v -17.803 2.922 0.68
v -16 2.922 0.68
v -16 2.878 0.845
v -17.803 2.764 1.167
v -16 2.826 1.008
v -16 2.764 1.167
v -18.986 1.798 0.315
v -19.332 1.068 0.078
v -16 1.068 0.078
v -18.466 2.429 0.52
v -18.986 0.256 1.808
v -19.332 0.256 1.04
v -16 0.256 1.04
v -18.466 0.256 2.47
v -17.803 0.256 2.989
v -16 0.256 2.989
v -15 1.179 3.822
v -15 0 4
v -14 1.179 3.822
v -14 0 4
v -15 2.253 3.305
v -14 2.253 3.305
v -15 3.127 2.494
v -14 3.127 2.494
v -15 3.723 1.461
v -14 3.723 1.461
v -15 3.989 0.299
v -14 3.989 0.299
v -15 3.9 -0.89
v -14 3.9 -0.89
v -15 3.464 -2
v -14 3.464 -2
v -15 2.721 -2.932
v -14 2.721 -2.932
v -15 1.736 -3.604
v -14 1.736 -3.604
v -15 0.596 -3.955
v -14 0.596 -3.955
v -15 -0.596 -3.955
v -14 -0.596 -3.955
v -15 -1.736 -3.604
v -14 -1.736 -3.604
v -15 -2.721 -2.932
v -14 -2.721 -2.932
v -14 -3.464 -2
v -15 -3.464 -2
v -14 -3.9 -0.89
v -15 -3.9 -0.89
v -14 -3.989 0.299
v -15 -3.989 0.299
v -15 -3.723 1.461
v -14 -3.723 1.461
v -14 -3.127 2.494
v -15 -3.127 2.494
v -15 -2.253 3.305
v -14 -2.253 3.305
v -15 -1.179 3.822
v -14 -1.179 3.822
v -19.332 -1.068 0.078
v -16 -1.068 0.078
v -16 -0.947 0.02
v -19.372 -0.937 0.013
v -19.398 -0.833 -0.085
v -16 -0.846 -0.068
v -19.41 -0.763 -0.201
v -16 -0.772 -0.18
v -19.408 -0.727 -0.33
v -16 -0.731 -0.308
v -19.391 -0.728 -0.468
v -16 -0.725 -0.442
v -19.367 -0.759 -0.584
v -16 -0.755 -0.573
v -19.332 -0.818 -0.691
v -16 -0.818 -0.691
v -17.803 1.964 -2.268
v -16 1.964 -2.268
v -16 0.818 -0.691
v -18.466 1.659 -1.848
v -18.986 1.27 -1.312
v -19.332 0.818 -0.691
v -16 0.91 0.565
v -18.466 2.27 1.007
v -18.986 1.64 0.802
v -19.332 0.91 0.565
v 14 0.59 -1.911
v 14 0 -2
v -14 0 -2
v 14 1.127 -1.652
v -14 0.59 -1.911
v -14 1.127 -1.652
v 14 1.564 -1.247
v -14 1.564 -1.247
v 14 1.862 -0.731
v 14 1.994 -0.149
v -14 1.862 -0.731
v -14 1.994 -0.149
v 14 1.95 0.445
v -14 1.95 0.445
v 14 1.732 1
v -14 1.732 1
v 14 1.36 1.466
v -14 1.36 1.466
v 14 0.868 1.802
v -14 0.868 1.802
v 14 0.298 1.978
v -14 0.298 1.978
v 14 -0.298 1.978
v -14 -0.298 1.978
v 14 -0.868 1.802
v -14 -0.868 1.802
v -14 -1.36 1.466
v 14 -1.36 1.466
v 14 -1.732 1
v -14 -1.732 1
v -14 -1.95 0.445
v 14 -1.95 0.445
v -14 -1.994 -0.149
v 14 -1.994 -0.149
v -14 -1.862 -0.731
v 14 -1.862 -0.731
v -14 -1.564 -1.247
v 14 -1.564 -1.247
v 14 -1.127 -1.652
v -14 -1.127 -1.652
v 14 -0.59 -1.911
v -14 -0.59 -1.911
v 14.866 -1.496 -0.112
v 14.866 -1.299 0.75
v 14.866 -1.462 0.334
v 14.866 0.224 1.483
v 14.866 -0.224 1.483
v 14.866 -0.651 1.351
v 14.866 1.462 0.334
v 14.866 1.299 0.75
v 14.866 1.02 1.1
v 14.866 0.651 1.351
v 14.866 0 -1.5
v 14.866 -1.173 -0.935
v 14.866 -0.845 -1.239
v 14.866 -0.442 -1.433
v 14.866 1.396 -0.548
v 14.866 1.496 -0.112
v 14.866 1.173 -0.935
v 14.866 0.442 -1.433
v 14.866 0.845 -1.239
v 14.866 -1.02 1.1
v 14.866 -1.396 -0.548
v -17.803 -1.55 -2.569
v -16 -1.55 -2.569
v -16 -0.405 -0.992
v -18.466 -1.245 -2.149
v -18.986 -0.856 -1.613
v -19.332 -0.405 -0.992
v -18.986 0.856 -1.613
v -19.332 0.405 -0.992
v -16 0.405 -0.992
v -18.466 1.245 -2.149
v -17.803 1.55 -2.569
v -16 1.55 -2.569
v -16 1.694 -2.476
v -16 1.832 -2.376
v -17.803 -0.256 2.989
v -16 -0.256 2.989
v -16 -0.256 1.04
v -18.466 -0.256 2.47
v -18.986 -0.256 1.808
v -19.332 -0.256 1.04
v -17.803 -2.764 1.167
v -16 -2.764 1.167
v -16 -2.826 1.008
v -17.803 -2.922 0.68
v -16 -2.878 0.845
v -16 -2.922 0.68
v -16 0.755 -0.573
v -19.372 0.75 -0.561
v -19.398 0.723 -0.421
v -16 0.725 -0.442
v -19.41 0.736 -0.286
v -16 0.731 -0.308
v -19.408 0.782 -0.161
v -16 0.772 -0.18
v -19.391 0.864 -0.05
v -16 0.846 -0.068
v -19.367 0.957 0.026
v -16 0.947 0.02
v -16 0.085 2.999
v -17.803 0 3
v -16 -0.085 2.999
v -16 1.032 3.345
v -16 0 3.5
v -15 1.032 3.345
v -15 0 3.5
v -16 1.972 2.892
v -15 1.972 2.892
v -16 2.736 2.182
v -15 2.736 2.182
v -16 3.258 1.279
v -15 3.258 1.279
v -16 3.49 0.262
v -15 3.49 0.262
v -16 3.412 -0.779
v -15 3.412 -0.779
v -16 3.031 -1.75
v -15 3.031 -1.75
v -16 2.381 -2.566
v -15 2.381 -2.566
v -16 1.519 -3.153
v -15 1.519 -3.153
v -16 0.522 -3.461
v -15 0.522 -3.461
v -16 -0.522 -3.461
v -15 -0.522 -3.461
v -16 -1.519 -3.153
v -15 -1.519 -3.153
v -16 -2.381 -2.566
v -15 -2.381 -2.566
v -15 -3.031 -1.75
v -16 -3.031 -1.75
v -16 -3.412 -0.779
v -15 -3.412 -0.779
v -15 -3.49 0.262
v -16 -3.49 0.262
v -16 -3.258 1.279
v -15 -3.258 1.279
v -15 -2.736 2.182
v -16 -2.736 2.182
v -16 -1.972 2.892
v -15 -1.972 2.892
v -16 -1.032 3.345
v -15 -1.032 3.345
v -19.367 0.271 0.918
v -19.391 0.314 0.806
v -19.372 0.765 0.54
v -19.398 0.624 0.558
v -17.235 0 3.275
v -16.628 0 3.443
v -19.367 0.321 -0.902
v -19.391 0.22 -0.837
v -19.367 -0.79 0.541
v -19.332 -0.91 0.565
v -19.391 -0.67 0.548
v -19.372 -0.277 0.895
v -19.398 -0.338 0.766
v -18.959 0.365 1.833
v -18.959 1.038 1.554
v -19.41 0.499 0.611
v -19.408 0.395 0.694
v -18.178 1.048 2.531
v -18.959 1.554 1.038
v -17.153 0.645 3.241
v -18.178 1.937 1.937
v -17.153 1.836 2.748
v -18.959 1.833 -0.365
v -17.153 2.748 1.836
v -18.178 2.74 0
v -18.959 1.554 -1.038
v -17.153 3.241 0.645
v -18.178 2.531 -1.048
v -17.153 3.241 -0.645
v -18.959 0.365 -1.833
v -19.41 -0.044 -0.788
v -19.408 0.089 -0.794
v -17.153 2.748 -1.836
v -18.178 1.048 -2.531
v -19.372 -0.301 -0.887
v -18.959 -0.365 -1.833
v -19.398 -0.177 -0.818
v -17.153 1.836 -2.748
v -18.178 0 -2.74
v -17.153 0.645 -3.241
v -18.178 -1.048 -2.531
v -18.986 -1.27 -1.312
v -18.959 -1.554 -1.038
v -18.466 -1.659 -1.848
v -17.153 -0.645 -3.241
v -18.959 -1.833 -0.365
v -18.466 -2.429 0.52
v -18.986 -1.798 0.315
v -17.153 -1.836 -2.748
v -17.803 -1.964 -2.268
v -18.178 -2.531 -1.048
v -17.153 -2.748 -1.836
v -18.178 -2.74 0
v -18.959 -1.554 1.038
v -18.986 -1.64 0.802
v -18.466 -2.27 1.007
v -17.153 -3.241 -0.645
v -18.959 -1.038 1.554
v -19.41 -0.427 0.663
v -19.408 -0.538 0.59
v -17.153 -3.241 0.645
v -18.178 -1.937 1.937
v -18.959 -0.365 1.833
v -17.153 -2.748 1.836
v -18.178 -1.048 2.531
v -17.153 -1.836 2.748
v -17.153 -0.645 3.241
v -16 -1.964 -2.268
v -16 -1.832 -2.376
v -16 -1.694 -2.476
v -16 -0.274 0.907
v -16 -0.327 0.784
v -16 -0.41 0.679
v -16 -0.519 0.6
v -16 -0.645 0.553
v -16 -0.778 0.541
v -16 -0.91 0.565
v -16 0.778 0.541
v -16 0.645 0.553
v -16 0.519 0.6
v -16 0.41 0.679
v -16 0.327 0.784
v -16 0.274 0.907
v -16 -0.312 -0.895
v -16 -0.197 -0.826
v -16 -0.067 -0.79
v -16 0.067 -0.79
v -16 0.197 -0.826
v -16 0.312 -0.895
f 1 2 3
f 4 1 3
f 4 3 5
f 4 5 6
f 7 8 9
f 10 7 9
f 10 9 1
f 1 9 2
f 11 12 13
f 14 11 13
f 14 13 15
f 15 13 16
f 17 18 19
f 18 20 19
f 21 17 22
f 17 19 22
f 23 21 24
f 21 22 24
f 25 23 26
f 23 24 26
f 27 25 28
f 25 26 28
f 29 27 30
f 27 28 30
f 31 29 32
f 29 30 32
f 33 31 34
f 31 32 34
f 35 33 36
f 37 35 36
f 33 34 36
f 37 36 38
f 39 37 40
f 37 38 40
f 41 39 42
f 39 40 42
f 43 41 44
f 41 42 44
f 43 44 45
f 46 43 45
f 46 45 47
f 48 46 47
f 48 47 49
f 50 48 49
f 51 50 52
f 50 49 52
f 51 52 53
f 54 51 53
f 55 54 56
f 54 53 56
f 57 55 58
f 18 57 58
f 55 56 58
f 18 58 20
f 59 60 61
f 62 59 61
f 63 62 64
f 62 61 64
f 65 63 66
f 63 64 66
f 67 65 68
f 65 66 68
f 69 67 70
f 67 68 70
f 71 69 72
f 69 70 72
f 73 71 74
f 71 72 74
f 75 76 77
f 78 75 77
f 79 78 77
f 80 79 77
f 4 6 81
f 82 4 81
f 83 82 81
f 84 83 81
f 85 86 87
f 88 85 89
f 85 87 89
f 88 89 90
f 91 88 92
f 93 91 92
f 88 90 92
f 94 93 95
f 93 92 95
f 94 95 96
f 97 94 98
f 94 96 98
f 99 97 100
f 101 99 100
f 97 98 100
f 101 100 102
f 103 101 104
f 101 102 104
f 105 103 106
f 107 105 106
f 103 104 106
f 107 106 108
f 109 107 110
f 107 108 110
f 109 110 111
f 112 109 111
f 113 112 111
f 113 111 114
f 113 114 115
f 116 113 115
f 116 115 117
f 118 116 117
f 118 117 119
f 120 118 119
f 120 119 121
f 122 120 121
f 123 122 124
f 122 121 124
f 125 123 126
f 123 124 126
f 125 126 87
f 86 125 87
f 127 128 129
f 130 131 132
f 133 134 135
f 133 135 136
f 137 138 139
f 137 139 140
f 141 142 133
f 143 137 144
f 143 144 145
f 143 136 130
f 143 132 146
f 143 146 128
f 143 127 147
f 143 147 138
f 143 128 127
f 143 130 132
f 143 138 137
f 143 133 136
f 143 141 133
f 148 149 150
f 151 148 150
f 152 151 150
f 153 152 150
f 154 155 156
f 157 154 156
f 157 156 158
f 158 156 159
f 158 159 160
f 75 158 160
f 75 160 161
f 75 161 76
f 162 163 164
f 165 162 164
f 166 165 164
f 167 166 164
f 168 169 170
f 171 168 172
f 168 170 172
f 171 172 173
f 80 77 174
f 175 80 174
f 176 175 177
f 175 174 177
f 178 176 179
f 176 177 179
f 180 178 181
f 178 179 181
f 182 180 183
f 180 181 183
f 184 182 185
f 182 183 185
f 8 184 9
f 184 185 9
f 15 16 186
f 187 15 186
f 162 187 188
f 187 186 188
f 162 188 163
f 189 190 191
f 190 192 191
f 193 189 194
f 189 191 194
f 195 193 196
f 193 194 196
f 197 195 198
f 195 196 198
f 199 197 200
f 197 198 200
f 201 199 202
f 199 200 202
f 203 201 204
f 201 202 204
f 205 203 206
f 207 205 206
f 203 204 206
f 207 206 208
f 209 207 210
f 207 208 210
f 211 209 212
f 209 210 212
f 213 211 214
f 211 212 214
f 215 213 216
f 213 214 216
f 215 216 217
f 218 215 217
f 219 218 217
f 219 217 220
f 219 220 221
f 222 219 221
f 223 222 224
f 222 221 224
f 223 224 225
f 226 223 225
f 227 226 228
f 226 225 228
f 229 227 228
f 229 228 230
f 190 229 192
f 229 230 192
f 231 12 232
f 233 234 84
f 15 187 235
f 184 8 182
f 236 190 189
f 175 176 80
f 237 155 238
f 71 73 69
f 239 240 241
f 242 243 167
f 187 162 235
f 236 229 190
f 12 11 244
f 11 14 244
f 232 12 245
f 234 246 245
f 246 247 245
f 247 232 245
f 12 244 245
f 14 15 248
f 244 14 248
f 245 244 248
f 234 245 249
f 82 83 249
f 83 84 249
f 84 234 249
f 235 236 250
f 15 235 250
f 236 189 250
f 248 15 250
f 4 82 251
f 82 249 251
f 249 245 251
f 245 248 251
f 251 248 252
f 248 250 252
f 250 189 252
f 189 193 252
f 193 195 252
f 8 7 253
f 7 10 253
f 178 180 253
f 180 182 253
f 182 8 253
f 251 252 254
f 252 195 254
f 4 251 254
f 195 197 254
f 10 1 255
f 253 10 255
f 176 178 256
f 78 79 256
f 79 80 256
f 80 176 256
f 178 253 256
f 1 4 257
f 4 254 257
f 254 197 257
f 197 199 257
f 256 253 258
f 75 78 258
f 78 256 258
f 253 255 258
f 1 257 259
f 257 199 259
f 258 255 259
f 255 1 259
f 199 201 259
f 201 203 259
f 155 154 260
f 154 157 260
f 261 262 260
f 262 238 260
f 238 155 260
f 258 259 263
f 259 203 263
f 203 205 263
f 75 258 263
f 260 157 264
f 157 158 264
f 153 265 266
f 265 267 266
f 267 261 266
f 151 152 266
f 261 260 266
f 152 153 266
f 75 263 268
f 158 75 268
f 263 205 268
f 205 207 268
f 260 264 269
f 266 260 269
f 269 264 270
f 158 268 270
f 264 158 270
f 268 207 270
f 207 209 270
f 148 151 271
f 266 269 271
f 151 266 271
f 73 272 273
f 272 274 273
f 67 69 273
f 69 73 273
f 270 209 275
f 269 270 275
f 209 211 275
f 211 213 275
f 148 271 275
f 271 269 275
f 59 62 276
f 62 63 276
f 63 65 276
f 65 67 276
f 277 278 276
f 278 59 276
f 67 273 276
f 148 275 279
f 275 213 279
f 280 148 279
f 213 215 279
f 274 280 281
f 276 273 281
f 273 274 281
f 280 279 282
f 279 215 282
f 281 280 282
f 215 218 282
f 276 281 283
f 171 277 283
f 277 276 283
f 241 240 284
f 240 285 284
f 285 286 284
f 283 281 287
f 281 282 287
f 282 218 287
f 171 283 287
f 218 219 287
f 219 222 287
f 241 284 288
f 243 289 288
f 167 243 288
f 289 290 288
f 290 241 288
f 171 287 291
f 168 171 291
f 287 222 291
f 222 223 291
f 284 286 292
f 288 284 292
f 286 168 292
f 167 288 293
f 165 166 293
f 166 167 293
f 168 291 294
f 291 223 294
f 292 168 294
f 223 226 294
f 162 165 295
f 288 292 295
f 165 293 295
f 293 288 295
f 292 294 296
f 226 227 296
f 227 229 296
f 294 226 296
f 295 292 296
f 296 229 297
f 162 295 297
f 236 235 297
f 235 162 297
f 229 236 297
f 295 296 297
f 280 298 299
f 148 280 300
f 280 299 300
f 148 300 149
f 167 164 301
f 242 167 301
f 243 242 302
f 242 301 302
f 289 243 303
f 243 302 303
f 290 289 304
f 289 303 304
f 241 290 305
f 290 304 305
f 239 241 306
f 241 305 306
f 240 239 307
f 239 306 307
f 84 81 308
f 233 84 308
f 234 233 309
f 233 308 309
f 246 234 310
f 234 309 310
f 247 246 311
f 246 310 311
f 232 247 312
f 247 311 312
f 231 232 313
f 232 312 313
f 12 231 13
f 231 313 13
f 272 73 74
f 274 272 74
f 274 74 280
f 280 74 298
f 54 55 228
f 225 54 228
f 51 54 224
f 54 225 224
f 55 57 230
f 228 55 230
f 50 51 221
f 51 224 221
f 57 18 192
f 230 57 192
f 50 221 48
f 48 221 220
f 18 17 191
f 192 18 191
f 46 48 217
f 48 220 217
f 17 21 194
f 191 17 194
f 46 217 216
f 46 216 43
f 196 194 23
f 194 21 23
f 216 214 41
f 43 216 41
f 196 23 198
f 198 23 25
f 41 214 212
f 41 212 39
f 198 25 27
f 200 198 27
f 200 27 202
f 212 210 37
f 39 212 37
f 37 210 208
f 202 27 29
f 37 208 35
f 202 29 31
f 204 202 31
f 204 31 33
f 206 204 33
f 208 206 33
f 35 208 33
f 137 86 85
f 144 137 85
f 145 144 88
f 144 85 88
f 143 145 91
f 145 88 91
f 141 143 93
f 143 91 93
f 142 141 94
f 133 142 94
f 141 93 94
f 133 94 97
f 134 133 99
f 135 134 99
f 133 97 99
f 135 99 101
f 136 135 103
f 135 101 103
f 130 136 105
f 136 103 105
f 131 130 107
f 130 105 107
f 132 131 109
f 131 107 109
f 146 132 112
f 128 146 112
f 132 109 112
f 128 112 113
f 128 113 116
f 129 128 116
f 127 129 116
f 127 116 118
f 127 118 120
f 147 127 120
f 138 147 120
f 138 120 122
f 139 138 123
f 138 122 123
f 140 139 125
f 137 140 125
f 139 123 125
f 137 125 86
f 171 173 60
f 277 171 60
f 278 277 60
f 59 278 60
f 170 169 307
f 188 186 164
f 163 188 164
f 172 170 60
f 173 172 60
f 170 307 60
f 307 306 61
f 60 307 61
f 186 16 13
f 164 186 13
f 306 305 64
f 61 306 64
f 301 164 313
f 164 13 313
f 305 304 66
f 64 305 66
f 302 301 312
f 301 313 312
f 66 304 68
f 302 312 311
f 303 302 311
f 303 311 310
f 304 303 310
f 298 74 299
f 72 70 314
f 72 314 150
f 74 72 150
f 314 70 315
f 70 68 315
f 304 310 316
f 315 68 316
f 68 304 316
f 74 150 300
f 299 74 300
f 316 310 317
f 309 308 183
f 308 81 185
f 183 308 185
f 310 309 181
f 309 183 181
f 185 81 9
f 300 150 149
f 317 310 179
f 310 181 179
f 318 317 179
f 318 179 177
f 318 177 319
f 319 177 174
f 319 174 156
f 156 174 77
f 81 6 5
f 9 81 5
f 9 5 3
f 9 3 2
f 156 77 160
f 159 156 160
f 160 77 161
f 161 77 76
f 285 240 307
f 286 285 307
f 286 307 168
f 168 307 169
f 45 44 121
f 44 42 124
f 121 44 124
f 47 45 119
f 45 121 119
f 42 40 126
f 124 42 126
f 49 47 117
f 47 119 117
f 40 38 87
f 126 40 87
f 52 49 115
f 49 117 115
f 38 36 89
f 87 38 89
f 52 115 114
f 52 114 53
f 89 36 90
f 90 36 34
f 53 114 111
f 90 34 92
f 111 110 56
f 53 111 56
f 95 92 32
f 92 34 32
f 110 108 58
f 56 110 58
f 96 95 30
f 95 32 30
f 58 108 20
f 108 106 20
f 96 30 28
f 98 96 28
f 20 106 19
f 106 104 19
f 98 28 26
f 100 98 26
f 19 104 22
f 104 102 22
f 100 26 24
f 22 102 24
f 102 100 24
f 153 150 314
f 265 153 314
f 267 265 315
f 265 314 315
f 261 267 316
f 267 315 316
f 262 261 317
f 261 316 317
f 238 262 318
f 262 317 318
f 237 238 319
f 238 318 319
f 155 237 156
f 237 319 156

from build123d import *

# Parameters (mm, degrees)
SKETCH2_R               = 2
BOSS_EXTRUDE1_DEPTH     = 28.866025404
CUT_EXTRUDE1_REACH      = 33.38
CUT_EXTRUDE1_END_RADIUS = 3.5
CHAMFER1_SIZE           = 0.5
CHAMFER1_SIZE2          = 0.866025404
FILLET1_R               = 0.5


with BuildPart() as part:
    # Sketch1 → Revolve1 (revolve)
    with BuildSketch(Plane(origin=(0, 0, 0), x_dir=(-1, 0, 0), z_dir=(0, 0, -1)), mode=Mode.PRIVATE) as revolve1_sk:
        with BuildLine():
            Line((14, 4), (14, 0))
            Line((14, 0), (19.5, 0))
            ThreePointArc((19.5, 0), (18.474873734, 2.474873734), (16, 3.5))
            Line((16, 3.5), (15, 3.5))
            Line((15, 3.5), (15, 4))
            Line((15, 4), (14, 4))
        make_face()
    revolve(revolve1_sk.sketch.rotate(Axis((-14, 0, 0), (-1, 0, 0)), 270), axis=Axis((-14, 0, 0), (-1, 0, 0)))

    # Sketch2 → Boss-Extrude1 (add)
    with BuildSketch(Plane(origin=(-14, 0, 0), x_dir=(0, 0, -1), z_dir=(1, 0, 0))):
        Circle(SKETCH2_R)
    extrude(amount=BOSS_EXTRUDE1_DEPTH)

    # Cut-Extrude1: up to this sphere (the profile starts inside it)
    cut_extrude1_end = Location((-16, 0, 0)) * Sphere(CUT_EXTRUDE1_END_RADIUS, mode=Mode.PRIVATE)
    # Sketch3 → Cut-Extrude1 (cut, up to the surface)
    with BuildSketch(Plane(origin=(-16, 0, 0), x_dir=(0, 0, -1), z_dir=(1, 0, 0)), mode=Mode.PRIVATE) as cut_extrude1_sk1:
        with BuildLine():
            Line((2.267866263, 1.963869297), (0.134474286, 0.413869297))
            Line((0.134474286, 0.413869297), (-0.680408938, 2.921821979))
            ThreePointArc((-0.680408938, 2.921821979), (-0.927050983, 2.853169549), (-1.166941475, 2.763737975))
            Line((-1.166941475, 2.763737975), (-0.352058252, 0.255785292))
            Line((-0.352058252, 0.255785292), (-2.989075758, 0.255785292))
            ThreePointArc((-2.989075758, 0.255785292), (-3, 0), (-2.989075758, -0.255785292))
            Line((-2.989075758, -0.255785292), (-0.352058252, -0.255785292))
            Line((-0.352058252, -0.255785292), (-1.166941475, -2.763737975))
            ThreePointArc((-1.166941475, -2.763737975), (-0.927050983, -2.853169549), (-0.680408938, -2.921821979))
            Line((-0.680408938, -2.921821979), (0.134474286, -0.413869297))
            Line((0.134474286, -0.413869297), (2.267866263, -1.963869297))
            ThreePointArc((2.267866263, -1.963869297), (2.427050983, -1.763355757), (2.568559908, -1.55))
            Line((2.568559908, -1.55), (0.435167931, 0))
            Line((0.435167931, 0), (2.568559908, 1.55))
            ThreePointArc((2.568559908, 1.55), (2.427050983, 1.763355757), (2.267866263, 1.963869297))
        make_face()
    cut_extrude1_tool1 = extrude(cut_extrude1_sk1.sketch, amount=-CUT_EXTRUDE1_REACH, mode=Mode.PRIVATE) & cut_extrude1_end
    add(cut_extrude1_tool1.solids().sort_by_distance((-16, 0, 0))[0], mode=Mode.SUBTRACT)

    # Chamfer1
    chamfer1_edges = [part.edges().sort_by_distance(p)[0] for p in [
        (14.866025404, 0, 2),
    ]]
    chamfer1_side = [part.faces().sort_by_distance(p)[0] for p in [
        (14.866025404, 0, 0),
    ]]
    chamfer(chamfer1_edges, length=CHAMFER1_SIZE, length2=CHAMFER1_SIZE2, reference=chamfer1_side[0])

    # Fillet1
    # the kernel refuses this fillet: 0.5 mm, written as the material it takes off along each edge
    with BuildSketch(Plane(origin=(-16, 0, -0.435167931), x_dir=(0, -0.5877852522924764, -0.8090169943749451), z_dir=(-1, 0, 0)), Plane(origin=(-16, -0.413869297, -0.134474286), x_dir=(0, -0.9510565162951523, 0.3090169943749514), z_dir=(-1, 0, 0)), Plane(origin=(-16, -0.255785292, 0.352058252), x_dir=(0, 0, 1), z_dir=(-1, 0, 0)), Plane(origin=(-16, 0.255785292, 0.352058252), x_dir=(0, 0.9510565162951548, 0.3090169943749436), z_dir=(-1, 0, 0)), Plane(origin=(-16, 0.413869297, -0.134474286), x_dir=(0, 0.5877852522924701, -0.8090169943749497), z_dir=(-1, 0, 0))) as fillet1_piece_1:
        with BuildLine():
            CenterArc((FILLET1_R * 1.37638192047, -FILLET1_R), FILLET1_R, 90, 108)
            Line((FILLET1_R * 0.425325404176, -FILLET1_R * 1.30901699437), (0, 0))
            Line((0, 0), (FILLET1_R * 1.37638192047, 0))
        make_face()
    extrude(amount=5.193319014, mode=Mode.SUBTRACT)


solid = part.part
